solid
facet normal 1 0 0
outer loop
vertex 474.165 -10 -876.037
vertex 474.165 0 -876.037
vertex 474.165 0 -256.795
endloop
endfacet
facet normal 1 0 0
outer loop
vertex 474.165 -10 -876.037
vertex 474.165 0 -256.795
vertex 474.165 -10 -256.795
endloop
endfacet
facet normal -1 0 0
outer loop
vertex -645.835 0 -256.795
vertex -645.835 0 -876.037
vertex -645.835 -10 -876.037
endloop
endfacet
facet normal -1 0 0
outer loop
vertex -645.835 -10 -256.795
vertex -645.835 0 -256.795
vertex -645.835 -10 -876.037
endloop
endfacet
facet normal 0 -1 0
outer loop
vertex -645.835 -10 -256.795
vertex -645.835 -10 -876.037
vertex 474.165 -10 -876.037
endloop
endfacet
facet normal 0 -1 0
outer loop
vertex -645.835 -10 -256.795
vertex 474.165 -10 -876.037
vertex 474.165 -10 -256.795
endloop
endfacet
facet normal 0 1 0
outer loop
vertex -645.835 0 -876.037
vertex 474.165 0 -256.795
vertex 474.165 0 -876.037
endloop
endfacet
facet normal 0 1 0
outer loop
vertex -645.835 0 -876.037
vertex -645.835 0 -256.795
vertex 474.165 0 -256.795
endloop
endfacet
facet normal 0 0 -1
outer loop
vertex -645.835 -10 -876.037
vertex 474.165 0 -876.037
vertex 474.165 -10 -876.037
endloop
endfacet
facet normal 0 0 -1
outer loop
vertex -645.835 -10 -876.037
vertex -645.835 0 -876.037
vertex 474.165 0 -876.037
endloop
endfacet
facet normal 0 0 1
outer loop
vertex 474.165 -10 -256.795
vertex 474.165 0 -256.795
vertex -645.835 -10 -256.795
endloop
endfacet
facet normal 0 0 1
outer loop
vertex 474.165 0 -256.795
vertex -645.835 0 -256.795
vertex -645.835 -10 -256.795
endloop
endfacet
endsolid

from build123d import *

# Parameters (mm, degrees)
F0_W     = 1100
F0_H     = 599.24144
F1_DEPTH = 10
F2_DEPTH = 10
F3_DEPTH = 10
F4_DEPTH = 10
F5_DEPTH = 10


with BuildPart() as f1:
    # F0 (on Front) → F1 (new body)
    with BuildSketch(Plane.XZ):
        with Locations((-85.8353115618, -566.4160771686)):
            Rectangle(F0_W, F0_H)
    extrude(amount=F1_DEPTH)

    # F2 (add): a face of the model
    f2_faces = [f1.faces().sort_by_distance(p)[0] for p in [
        (-85.8353115618, -5, -266.7953571686),
    ]]
    extrude(f2_faces, amount=F2_DEPTH)

    # F3 (add): a face of the model
    f3_faces = [f1.faces().sort_by_distance(p)[0] for p in [
        (-635.8353115618, -5, -561.4160771686),
    ]]
    extrude(f3_faces, amount=F3_DEPTH)

    # F4 (add): a face of the model
    f4_faces = [f1.faces().sort_by_distance(p)[0] for p in [
        (-90.8353115618, -5, -866.0367971686),
    ]]
    extrude(f4_faces, amount=F4_DEPTH)

    # F5 (add): a face of the model
    f5_faces = [f1.faces().sort_by_distance(p)[0] for p in [
        (464.1646884382, -5, -566.4160771686),
    ]]
    extrude(f5_faces, amount=F5_DEPTH)


solid = f1.part
